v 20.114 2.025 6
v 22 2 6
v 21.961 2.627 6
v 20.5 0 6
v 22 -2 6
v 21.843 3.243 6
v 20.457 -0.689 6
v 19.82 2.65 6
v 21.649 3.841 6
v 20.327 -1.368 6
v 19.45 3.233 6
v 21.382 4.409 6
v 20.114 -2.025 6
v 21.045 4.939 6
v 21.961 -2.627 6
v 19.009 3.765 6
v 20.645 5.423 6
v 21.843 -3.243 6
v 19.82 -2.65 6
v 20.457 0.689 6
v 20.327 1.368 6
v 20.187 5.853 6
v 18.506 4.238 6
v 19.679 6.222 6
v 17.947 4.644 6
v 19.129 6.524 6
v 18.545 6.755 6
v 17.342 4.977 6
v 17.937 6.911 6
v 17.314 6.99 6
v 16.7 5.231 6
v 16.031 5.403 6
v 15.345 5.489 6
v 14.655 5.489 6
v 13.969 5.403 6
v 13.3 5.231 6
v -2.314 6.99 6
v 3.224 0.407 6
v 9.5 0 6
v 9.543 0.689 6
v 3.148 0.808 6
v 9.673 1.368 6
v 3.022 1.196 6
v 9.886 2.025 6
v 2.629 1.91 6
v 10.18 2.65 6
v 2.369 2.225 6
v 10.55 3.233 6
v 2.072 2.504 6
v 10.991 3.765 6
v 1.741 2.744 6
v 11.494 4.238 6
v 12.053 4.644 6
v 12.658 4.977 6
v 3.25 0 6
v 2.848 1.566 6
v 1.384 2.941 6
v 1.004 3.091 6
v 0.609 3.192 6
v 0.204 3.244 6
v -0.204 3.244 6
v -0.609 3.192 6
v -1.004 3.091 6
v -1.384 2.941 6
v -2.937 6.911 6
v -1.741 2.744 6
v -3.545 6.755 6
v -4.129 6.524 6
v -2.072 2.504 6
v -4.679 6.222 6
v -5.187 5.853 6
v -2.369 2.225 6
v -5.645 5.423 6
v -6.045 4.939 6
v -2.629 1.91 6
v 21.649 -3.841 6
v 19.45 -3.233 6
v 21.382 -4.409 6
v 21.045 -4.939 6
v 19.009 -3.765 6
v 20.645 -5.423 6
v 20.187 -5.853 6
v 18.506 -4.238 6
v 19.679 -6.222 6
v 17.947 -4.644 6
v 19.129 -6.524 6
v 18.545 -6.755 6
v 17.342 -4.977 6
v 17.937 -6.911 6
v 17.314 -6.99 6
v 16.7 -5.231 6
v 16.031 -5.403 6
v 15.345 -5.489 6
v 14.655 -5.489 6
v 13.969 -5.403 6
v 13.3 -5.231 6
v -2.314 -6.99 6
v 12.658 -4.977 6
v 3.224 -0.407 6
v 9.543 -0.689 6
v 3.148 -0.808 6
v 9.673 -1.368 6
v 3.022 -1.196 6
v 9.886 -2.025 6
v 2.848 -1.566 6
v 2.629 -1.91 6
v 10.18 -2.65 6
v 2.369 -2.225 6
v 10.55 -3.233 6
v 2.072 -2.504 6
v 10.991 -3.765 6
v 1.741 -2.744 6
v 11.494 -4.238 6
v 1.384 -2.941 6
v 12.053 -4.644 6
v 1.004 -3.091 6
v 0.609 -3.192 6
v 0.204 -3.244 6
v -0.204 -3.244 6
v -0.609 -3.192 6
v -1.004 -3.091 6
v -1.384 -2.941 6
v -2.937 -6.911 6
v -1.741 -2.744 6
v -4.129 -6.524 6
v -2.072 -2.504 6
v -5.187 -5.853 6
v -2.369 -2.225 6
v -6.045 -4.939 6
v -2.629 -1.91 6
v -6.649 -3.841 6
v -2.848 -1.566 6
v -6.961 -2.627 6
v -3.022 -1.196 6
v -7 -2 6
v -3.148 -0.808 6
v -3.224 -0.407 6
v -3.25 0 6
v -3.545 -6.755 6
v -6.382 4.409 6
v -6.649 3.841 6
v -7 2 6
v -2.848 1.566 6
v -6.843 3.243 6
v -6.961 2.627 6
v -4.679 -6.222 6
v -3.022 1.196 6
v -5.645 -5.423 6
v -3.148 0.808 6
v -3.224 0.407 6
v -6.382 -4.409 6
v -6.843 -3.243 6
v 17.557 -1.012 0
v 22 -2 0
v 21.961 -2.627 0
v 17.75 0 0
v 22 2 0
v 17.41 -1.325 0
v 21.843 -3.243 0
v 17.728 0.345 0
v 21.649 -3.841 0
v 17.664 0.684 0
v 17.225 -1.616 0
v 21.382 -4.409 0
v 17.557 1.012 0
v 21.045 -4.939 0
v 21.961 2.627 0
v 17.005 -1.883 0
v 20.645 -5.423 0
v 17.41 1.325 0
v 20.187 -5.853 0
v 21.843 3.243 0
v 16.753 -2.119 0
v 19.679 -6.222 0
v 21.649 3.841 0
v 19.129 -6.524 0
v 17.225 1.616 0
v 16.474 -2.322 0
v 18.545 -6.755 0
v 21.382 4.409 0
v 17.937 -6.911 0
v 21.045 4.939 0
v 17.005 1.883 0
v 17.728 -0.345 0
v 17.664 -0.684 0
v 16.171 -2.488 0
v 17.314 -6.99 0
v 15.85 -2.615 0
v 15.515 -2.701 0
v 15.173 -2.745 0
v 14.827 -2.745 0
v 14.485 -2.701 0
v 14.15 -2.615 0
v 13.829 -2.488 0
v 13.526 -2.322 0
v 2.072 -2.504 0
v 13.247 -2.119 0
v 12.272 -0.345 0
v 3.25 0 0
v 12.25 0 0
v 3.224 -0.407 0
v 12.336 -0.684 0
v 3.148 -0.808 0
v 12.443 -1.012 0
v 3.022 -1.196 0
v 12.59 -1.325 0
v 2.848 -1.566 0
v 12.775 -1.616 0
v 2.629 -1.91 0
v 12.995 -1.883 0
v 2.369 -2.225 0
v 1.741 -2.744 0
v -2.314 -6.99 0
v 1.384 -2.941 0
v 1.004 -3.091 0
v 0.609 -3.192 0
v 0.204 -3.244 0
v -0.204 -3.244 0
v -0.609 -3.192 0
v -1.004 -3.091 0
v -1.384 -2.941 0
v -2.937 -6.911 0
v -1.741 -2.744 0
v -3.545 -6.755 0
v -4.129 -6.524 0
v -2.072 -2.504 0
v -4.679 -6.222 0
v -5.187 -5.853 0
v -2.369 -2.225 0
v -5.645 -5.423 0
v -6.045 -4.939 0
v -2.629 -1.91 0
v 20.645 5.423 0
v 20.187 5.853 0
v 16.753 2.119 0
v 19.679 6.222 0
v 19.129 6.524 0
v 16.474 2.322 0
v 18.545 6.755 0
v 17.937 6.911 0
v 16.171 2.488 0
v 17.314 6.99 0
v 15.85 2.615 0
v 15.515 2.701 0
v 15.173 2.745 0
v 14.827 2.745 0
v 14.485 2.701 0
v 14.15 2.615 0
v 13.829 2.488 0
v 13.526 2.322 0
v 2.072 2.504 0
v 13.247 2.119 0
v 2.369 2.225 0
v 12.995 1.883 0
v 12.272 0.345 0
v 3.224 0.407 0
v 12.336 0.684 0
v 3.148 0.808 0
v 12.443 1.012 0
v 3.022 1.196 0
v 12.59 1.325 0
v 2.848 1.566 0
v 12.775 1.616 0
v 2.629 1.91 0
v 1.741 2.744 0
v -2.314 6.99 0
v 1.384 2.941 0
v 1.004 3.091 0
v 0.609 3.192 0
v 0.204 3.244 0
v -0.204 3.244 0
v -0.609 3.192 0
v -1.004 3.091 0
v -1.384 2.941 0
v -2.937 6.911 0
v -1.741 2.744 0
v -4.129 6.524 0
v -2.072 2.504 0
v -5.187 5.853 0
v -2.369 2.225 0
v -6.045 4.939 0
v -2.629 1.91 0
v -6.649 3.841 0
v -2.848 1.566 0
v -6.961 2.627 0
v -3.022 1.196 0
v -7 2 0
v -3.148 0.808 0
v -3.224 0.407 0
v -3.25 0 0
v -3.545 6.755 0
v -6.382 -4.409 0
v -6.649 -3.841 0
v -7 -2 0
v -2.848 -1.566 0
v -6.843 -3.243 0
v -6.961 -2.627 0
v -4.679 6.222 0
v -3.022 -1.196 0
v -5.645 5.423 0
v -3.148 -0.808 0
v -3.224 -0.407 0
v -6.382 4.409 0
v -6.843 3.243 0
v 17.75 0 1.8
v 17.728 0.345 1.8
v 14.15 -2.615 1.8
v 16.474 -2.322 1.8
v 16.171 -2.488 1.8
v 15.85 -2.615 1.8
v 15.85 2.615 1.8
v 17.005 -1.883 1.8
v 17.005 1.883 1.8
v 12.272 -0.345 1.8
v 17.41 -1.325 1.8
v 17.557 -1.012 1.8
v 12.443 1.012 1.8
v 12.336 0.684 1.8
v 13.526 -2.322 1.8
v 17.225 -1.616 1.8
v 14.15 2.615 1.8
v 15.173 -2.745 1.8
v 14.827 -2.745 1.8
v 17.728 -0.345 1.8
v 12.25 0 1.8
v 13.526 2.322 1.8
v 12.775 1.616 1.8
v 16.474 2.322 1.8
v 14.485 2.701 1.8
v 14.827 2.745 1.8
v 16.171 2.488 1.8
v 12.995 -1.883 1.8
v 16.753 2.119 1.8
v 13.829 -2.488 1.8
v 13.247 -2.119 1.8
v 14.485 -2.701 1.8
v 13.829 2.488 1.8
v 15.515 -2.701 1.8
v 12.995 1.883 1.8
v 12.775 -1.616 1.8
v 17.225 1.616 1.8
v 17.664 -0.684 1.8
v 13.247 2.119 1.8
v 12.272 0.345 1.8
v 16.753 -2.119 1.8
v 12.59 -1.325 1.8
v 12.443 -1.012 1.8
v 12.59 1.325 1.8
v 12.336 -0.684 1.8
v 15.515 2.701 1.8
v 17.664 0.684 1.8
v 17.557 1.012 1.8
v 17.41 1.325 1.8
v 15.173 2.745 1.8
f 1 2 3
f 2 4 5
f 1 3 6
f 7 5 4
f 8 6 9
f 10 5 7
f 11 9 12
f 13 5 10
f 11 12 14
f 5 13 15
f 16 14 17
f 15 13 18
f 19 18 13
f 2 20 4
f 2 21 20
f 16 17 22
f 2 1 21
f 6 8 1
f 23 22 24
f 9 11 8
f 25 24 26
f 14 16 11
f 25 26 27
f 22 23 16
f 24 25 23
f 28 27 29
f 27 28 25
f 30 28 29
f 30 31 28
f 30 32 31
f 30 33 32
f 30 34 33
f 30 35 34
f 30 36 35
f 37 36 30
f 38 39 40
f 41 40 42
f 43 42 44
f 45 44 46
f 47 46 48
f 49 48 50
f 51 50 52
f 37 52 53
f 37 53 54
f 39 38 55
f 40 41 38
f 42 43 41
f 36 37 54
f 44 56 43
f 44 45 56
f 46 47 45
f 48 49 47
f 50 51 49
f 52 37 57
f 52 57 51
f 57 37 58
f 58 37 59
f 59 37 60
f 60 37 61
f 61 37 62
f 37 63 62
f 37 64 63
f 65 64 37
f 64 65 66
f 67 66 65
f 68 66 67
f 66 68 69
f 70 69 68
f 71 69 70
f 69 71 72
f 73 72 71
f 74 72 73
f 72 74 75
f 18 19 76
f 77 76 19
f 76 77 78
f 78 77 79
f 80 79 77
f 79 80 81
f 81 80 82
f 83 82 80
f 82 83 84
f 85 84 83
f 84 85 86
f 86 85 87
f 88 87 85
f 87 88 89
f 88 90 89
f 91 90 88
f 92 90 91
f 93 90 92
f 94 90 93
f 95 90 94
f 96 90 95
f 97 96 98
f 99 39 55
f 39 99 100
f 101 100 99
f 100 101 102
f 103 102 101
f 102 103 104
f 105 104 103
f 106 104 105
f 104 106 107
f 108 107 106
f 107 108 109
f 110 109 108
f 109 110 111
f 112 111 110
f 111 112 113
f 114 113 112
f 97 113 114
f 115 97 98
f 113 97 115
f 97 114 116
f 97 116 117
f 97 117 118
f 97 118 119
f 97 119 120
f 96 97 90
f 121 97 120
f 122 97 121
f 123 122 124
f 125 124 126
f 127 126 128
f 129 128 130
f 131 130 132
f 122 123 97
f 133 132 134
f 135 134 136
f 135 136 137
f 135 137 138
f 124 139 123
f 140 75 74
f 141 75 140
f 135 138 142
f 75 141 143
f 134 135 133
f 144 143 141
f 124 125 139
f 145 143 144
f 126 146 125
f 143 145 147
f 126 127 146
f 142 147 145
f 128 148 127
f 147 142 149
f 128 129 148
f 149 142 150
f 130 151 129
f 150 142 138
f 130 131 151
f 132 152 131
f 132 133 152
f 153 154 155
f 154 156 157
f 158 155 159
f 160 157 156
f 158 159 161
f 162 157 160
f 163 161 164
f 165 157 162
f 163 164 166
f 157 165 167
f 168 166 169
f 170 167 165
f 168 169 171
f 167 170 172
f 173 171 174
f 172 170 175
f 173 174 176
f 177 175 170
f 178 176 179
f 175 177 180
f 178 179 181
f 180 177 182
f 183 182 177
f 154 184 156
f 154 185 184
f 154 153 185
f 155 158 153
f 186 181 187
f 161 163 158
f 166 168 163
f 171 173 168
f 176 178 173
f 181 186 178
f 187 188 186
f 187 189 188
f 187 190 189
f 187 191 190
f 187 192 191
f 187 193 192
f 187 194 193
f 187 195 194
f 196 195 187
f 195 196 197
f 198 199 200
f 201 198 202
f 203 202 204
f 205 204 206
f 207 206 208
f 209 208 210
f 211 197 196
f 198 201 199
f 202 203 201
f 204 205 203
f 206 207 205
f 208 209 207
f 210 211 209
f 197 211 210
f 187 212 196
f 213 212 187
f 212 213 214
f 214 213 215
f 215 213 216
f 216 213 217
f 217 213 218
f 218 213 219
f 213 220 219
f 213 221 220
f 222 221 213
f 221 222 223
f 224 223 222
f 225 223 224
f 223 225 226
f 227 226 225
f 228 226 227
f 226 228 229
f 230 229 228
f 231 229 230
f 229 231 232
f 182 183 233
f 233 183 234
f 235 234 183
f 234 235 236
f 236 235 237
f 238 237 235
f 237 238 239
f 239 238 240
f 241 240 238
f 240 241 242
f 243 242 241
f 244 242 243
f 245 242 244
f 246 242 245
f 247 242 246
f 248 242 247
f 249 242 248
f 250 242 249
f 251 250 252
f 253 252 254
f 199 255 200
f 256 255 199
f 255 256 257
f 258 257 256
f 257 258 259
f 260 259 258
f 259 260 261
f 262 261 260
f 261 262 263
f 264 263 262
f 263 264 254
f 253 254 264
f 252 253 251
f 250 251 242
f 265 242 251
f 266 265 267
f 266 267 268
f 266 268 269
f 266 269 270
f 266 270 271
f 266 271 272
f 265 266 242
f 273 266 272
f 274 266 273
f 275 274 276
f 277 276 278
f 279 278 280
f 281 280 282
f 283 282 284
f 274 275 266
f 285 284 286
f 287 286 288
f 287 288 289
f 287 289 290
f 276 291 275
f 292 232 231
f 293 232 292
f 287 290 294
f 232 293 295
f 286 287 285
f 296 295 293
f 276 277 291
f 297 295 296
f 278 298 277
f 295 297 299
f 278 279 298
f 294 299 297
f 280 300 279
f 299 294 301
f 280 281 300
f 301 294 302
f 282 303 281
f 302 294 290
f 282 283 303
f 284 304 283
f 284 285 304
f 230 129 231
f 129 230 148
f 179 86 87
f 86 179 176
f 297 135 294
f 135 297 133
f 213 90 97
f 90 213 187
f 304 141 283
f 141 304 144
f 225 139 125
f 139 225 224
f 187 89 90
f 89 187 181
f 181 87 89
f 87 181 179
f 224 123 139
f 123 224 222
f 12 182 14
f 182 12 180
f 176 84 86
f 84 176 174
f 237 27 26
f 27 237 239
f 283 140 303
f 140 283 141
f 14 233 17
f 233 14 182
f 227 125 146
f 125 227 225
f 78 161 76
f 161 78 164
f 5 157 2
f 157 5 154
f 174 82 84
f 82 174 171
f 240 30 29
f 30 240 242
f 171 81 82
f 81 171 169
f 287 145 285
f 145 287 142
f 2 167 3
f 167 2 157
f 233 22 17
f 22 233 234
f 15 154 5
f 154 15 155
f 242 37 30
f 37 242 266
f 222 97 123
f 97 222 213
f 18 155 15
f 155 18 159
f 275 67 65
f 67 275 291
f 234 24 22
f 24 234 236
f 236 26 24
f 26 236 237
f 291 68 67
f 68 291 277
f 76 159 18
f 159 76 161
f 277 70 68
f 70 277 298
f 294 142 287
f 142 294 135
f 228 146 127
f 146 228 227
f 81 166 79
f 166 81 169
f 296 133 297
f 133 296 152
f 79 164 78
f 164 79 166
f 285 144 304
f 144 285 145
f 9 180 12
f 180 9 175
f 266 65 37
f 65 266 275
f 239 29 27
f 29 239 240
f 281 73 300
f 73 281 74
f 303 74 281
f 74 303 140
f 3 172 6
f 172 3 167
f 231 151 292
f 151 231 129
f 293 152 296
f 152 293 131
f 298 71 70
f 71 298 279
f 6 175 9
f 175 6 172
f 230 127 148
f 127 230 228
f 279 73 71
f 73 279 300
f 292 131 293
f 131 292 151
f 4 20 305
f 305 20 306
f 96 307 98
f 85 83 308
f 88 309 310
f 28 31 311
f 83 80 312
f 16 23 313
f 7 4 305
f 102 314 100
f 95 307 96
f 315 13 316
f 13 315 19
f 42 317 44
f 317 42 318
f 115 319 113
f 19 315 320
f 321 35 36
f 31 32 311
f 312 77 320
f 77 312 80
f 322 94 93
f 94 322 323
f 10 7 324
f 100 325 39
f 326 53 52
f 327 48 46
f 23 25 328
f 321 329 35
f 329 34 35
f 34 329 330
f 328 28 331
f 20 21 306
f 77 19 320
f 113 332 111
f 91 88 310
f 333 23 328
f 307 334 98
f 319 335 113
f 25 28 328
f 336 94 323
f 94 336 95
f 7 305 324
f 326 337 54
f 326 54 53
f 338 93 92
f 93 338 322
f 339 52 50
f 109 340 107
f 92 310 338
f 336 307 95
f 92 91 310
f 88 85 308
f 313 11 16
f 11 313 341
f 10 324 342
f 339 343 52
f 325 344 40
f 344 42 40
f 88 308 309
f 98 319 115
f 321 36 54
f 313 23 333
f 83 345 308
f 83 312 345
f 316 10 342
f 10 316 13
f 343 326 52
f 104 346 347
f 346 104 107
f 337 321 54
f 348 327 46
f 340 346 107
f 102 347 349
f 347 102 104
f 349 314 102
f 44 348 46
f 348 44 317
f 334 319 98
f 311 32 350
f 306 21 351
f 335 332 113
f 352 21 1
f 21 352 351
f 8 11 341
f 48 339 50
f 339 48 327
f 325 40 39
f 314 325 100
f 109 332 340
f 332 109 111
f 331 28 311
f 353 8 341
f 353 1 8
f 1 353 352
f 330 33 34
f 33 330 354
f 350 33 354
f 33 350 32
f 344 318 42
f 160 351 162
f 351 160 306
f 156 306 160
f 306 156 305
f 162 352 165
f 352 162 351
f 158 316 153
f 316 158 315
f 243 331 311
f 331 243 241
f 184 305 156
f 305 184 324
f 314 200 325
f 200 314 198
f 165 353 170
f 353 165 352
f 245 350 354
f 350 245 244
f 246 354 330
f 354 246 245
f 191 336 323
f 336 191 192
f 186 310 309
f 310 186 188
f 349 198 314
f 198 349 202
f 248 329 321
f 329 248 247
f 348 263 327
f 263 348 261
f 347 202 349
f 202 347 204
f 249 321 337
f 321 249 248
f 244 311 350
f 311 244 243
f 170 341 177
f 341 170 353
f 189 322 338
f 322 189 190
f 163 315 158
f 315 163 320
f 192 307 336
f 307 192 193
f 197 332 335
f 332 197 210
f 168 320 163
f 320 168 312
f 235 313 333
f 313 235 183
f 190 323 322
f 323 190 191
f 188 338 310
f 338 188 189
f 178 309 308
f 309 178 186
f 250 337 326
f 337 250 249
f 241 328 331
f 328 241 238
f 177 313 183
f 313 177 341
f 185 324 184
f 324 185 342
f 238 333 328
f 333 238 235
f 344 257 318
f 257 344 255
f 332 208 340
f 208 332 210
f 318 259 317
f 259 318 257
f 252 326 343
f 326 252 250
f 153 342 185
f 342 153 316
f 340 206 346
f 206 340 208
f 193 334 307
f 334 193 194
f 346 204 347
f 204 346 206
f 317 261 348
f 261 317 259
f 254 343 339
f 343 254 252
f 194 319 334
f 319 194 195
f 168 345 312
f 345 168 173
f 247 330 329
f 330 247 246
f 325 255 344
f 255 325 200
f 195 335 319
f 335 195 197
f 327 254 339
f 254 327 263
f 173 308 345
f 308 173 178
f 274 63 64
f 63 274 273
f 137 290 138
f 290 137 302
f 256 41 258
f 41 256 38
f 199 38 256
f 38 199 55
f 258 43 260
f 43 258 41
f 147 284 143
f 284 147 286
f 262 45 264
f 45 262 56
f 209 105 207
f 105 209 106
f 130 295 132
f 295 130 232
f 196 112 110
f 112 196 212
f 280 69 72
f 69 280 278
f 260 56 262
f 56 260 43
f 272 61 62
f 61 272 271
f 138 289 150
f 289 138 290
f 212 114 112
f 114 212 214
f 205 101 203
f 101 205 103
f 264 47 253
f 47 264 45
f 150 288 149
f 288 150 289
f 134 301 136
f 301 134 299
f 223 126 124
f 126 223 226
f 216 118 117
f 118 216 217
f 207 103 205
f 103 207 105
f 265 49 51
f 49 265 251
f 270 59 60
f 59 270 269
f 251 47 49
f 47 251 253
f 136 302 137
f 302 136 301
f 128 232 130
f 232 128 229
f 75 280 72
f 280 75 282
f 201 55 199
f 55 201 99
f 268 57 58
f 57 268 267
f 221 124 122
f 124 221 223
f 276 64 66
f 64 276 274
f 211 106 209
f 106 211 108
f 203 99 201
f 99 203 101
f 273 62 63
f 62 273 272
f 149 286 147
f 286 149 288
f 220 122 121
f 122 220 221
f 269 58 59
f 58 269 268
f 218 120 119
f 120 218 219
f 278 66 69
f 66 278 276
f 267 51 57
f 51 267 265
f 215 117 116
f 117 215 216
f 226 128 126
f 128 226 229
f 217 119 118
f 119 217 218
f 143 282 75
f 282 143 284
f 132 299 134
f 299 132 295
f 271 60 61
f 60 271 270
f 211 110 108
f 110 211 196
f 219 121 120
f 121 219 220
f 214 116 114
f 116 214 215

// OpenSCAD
$fn = 50;


difference() {
	union() {
		cylinder(h = 6, r = 7.0000000000);
		translate(v = [7.5000000000, 0.0000000000, 0]) {
			hull() {
				translate(v = [-9.5000000000, 2.0000000000, 0]) {
					cylinder(h = 6, r = 5);
				}
				translate(v = [9.5000000000, 2.0000000000, 0]) {
					cylinder(h = 6, r = 5);
				}
				translate(v = [-9.5000000000, -2.0000000000, 0]) {
					cylinder(h = 6, r = 5);
				}
				translate(v = [9.5000000000, -2.0000000000, 0]) {
					cylinder(h = 6, r = 5);
				}
			}
		}
		translate(v = [7.5000000000, 0.0000000000, 0]) {
			hull() {
				translate(v = [-9.5000000000, 2.0000000000, 0]) {
					cylinder(h = 6, r = 5);
				}
				translate(v = [9.5000000000, 2.0000000000, 0]) {
					cylinder(h = 6, r = 5);
				}
				translate(v = [-9.5000000000, -2.0000000000, 0]) {
					cylinder(h = 6, r = 5);
				}
				translate(v = [9.5000000000, -2.0000000000, 0]) {
					cylinder(h = 6, r = 5);
				}
			}
		}
	}
	union() {
		translate(v = [15.0000000000, 0.0000000000, 6]) {
			rotate(a = [0, 0, 0]) {
				difference() {
					union() {
						#translate(v = [0, 0, -6.0000000000]) {
							cylinder(h = 6, r = 2.2500000000);
						}
						#translate(v = [0, 0, -4.2000000000]) {
							cylinder(h = 4.2000000000, r1 = 2.7500000000, r2 = 5.5000000000);
						}
						#translate(v = [0, 0, -6.0000000000]) {
							cylinder(h = 6, r = 2.7500000000);
						}
						#translate(v = [0, 0, -6.0000000000]) {
							cylinder(h = 6, r = 2.2500000000);
						}
					}
					union();
				}
			}
		}
		translate(v = [15.0000000000, 0.0000000000, 6]) {
			rotate(a = [0, 0, 0]) {
				difference() {
					union() {
						#translate(v = [0, 0, -6.0000000000]) {
							cylinder(h = 6, r = 2.2500000000);
						}
						#translate(v = [0, 0, -4.2000000000]) {
							cylinder(h = 4.2000000000, r1 = 2.7500000000, r2 = 5.5000000000);
						}
						#translate(v = [0, 0, -6.0000000000]) {
							cylinder(h = 6, r = 2.7500000000);
						}
						#translate(v = [0, 0, -6.0000000000]) {
							cylinder(h = 6, r = 2.2500000000);
						}
					}
					union();
				}
			}
		}
		translate(v = [0, 0, -100]) {
			cylinder(h = 200, r = 3.2500000000);
		}
		translate(v = [0, 0, -100]) {
			cylinder(h = 200, r = 1.8000000000);
		}
	}
}
